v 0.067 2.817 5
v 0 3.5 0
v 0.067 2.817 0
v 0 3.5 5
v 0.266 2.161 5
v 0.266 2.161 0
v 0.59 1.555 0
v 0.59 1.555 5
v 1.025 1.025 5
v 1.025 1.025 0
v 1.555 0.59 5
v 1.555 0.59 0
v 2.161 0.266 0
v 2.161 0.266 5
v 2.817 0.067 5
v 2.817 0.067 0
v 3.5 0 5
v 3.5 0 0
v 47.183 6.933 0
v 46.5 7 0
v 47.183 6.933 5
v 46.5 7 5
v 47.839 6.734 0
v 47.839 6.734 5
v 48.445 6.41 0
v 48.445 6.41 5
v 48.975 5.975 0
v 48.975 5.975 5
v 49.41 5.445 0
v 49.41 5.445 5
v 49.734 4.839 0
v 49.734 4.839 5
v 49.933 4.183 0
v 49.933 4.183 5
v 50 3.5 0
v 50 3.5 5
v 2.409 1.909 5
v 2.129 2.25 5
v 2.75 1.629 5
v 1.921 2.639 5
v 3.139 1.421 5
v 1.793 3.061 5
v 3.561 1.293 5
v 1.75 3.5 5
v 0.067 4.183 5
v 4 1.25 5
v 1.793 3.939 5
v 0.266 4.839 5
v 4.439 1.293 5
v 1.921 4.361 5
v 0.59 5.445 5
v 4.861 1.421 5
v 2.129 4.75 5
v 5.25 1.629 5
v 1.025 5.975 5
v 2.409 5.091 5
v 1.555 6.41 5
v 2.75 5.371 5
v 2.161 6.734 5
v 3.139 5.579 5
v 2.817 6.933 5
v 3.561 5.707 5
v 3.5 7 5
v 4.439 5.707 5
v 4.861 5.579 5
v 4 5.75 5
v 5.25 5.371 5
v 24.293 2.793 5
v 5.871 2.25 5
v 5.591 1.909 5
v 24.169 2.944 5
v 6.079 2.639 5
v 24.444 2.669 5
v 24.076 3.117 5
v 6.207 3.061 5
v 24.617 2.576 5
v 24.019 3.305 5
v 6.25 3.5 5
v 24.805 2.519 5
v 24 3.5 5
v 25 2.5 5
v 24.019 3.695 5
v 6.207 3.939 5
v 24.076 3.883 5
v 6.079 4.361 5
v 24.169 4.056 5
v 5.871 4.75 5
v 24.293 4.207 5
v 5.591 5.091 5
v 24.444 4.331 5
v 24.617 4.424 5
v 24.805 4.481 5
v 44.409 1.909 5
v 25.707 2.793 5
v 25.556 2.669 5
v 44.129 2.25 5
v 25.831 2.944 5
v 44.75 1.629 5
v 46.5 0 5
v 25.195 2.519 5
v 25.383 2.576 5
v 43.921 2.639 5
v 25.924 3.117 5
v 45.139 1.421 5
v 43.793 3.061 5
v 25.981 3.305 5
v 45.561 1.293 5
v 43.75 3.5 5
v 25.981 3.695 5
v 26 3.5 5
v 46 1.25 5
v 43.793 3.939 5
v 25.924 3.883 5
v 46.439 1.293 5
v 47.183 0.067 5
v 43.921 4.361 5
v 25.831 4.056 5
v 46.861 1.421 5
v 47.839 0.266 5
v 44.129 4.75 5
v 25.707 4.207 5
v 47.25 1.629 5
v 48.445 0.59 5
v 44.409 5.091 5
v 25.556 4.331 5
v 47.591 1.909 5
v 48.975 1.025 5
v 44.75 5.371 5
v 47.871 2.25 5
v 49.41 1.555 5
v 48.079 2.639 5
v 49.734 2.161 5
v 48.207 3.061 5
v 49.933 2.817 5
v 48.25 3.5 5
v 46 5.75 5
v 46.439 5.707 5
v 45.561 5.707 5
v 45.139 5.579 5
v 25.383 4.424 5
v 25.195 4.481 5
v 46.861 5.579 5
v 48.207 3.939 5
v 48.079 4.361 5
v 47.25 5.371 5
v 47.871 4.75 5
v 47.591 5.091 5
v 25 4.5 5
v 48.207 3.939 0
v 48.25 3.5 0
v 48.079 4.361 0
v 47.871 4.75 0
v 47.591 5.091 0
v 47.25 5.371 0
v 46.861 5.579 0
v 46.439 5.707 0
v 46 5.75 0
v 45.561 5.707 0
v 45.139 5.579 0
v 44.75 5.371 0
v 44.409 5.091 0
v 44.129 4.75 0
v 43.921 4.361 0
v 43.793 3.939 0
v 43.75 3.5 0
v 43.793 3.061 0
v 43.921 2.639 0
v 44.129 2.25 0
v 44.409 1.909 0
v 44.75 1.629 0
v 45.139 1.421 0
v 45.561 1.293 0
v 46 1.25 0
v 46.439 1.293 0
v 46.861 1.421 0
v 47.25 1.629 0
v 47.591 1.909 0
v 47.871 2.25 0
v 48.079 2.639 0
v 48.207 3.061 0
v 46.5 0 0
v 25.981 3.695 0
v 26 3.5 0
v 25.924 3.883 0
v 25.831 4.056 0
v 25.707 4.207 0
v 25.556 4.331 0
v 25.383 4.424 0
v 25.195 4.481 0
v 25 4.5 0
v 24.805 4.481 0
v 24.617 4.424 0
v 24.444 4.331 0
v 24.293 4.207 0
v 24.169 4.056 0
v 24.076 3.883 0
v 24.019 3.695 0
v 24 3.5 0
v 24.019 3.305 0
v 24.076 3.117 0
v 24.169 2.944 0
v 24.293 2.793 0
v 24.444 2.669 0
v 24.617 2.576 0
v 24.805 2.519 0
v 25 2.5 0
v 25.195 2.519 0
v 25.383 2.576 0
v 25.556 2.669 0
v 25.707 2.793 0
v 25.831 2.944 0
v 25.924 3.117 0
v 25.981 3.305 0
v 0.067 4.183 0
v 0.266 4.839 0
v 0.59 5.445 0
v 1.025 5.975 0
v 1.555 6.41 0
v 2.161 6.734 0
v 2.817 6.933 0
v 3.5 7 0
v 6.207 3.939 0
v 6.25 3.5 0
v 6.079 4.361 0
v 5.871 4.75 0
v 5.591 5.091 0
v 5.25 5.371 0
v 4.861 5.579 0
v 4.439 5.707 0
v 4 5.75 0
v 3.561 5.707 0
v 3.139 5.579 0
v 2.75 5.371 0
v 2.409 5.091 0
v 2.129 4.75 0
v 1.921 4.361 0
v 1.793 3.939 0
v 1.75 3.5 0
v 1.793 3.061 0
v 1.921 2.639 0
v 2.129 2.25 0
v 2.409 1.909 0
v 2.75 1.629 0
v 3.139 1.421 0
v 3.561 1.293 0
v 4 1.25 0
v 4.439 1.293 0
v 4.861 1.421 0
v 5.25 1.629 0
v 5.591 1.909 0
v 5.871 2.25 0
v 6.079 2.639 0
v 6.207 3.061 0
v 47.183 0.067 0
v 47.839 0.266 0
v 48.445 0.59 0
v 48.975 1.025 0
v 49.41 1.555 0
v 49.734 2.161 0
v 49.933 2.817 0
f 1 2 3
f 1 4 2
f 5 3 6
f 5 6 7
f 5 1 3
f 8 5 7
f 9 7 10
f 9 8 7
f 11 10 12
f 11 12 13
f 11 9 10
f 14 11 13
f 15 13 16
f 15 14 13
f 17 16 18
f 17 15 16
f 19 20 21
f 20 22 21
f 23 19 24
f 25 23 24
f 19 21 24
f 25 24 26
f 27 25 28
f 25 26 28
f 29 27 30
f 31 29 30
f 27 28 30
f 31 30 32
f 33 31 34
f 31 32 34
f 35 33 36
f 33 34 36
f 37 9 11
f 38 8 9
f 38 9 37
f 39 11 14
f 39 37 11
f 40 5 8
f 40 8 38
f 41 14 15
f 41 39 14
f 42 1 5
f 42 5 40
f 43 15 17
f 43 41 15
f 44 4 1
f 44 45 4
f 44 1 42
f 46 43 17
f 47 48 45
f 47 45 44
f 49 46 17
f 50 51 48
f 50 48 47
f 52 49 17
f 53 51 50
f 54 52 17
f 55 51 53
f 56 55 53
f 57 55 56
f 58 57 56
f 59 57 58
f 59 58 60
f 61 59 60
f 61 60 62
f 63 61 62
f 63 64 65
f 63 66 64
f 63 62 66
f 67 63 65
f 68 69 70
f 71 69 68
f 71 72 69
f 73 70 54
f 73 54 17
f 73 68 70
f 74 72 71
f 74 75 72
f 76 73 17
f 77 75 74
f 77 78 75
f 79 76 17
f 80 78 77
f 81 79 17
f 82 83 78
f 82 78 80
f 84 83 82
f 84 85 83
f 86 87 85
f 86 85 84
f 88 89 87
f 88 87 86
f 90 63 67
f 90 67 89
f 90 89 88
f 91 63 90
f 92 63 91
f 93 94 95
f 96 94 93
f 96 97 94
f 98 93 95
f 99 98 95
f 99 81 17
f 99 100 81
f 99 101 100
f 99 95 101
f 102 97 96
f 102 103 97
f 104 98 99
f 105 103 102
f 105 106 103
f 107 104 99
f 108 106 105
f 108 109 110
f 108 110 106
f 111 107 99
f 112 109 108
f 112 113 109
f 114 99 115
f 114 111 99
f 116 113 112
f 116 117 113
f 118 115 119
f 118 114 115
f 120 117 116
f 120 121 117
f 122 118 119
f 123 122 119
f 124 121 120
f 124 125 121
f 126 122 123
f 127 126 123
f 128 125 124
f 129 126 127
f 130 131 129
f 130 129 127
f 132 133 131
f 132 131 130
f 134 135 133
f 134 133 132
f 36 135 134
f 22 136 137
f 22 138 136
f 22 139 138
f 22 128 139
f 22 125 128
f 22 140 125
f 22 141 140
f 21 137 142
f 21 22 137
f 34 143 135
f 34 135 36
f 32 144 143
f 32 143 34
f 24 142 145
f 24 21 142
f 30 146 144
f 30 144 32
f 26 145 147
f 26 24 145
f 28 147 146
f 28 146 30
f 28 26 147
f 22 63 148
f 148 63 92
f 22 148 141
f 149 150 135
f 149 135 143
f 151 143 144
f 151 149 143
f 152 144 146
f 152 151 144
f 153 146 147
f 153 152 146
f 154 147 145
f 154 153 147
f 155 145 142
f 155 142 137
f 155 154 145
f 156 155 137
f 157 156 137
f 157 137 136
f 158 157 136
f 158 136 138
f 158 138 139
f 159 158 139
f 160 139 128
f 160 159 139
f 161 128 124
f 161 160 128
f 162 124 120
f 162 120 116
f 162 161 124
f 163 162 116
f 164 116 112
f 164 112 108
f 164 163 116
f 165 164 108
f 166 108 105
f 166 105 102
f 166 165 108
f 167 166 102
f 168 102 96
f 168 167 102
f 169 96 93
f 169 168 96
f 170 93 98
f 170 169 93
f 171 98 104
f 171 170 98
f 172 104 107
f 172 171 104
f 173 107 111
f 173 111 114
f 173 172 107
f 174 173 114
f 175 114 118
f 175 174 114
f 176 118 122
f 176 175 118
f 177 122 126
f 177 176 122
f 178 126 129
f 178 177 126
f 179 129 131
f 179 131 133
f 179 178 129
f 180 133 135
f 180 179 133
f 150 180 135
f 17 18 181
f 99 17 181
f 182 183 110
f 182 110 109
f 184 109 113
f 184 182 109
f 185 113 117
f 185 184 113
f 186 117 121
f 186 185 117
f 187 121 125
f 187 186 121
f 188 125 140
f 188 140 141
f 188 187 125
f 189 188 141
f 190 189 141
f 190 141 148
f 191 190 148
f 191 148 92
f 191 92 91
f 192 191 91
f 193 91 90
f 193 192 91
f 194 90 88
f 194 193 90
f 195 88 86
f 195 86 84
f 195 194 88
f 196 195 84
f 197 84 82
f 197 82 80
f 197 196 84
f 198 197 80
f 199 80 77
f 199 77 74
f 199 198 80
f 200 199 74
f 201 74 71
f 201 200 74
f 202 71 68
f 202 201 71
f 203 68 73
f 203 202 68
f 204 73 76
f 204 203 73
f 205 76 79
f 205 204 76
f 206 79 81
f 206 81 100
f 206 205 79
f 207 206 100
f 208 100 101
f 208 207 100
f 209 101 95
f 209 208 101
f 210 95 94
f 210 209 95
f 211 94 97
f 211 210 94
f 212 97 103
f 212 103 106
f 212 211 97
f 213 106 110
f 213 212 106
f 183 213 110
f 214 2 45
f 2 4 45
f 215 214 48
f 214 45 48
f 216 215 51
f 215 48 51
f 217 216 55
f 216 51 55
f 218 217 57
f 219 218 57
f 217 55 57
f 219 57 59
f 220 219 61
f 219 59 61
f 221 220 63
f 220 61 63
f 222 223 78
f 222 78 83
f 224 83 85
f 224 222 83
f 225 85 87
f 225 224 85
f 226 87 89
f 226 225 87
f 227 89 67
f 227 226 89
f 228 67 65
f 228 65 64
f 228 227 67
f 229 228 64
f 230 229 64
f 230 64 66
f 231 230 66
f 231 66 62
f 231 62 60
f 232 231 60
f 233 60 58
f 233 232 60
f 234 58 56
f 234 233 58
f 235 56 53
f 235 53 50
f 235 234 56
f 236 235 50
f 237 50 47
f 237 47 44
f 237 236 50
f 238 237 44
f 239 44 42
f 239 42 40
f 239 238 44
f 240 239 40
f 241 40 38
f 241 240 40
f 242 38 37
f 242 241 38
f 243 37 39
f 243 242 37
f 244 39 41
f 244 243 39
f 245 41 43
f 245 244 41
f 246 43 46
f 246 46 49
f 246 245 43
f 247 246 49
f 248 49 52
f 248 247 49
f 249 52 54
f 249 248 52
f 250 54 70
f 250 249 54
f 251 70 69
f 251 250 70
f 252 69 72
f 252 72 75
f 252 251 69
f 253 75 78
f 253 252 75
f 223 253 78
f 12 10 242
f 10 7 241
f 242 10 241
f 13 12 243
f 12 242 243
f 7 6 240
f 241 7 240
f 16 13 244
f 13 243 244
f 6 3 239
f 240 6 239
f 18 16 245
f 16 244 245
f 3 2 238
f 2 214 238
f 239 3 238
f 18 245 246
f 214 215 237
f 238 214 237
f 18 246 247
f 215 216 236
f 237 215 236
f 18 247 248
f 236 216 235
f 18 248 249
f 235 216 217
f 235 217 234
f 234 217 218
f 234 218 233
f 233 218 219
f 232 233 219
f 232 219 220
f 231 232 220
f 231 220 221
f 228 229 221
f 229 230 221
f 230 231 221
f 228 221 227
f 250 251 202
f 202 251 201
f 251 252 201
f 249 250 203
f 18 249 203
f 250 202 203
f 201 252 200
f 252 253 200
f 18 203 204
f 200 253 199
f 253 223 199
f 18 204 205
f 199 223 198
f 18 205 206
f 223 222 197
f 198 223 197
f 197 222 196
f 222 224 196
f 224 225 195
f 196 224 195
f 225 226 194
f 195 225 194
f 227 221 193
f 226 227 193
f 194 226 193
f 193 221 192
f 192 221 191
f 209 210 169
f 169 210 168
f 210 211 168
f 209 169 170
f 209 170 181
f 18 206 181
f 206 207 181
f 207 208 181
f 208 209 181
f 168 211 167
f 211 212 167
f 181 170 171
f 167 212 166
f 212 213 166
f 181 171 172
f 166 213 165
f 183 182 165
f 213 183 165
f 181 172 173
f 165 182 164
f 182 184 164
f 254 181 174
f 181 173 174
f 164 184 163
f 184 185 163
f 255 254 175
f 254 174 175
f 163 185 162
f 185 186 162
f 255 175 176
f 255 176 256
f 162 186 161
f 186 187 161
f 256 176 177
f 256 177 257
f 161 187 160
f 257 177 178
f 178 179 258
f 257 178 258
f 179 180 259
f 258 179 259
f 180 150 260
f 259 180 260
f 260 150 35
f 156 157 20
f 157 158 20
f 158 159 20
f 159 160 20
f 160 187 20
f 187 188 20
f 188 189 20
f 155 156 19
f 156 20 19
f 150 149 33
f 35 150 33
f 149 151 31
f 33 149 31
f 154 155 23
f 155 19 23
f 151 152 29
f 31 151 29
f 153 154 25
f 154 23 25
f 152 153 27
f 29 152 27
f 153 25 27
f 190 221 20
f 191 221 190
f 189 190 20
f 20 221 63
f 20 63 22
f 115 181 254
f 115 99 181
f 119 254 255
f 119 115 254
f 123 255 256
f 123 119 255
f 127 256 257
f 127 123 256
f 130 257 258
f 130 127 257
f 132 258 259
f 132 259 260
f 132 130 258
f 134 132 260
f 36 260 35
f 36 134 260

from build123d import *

# Parameters (mm, degrees)
ESBO_O1_W                = 50
ESBO_O1_H                = 7
ESBO_O1_R                = 1
ESBO_O1_R_2              = 2.25
RESSALTO_EXTRUS_O1_DEPTH = 5
FILETE1_R                = 3.5


with BuildPart() as part:
    # Esboço1 → Ressalto-extrusão1 (new body)
    with BuildSketch(Plane.XY):
        with Locations((25, 3.5)):
            Rectangle(ESBO_O1_W, ESBO_O1_H)
        with Locations((25, 3.5)):
            Circle(ESBO_O1_R, mode=Mode.SUBTRACT)
        with Locations((4, 3.5)):
            Circle(ESBO_O1_R_2, mode=Mode.SUBTRACT)
        with Locations((46, 3.5)):
            Circle(ESBO_O1_R_2, mode=Mode.SUBTRACT)
    extrude(amount=RESSALTO_EXTRUS_O1_DEPTH)

    # Filete1
    filete1_edges = [part.edges().sort_by_distance(p)[0] for p in [
        (50, 0, 2.5),
        (50, 7, 2.5),
        (0, 0, 2.5),
        (0, 7, 2.5),
    ]]
    fillet(filete1_edges, radius=FILETE1_R - 0.0001)  # a hair under: the kernel refuses the full size


solid = part.part
